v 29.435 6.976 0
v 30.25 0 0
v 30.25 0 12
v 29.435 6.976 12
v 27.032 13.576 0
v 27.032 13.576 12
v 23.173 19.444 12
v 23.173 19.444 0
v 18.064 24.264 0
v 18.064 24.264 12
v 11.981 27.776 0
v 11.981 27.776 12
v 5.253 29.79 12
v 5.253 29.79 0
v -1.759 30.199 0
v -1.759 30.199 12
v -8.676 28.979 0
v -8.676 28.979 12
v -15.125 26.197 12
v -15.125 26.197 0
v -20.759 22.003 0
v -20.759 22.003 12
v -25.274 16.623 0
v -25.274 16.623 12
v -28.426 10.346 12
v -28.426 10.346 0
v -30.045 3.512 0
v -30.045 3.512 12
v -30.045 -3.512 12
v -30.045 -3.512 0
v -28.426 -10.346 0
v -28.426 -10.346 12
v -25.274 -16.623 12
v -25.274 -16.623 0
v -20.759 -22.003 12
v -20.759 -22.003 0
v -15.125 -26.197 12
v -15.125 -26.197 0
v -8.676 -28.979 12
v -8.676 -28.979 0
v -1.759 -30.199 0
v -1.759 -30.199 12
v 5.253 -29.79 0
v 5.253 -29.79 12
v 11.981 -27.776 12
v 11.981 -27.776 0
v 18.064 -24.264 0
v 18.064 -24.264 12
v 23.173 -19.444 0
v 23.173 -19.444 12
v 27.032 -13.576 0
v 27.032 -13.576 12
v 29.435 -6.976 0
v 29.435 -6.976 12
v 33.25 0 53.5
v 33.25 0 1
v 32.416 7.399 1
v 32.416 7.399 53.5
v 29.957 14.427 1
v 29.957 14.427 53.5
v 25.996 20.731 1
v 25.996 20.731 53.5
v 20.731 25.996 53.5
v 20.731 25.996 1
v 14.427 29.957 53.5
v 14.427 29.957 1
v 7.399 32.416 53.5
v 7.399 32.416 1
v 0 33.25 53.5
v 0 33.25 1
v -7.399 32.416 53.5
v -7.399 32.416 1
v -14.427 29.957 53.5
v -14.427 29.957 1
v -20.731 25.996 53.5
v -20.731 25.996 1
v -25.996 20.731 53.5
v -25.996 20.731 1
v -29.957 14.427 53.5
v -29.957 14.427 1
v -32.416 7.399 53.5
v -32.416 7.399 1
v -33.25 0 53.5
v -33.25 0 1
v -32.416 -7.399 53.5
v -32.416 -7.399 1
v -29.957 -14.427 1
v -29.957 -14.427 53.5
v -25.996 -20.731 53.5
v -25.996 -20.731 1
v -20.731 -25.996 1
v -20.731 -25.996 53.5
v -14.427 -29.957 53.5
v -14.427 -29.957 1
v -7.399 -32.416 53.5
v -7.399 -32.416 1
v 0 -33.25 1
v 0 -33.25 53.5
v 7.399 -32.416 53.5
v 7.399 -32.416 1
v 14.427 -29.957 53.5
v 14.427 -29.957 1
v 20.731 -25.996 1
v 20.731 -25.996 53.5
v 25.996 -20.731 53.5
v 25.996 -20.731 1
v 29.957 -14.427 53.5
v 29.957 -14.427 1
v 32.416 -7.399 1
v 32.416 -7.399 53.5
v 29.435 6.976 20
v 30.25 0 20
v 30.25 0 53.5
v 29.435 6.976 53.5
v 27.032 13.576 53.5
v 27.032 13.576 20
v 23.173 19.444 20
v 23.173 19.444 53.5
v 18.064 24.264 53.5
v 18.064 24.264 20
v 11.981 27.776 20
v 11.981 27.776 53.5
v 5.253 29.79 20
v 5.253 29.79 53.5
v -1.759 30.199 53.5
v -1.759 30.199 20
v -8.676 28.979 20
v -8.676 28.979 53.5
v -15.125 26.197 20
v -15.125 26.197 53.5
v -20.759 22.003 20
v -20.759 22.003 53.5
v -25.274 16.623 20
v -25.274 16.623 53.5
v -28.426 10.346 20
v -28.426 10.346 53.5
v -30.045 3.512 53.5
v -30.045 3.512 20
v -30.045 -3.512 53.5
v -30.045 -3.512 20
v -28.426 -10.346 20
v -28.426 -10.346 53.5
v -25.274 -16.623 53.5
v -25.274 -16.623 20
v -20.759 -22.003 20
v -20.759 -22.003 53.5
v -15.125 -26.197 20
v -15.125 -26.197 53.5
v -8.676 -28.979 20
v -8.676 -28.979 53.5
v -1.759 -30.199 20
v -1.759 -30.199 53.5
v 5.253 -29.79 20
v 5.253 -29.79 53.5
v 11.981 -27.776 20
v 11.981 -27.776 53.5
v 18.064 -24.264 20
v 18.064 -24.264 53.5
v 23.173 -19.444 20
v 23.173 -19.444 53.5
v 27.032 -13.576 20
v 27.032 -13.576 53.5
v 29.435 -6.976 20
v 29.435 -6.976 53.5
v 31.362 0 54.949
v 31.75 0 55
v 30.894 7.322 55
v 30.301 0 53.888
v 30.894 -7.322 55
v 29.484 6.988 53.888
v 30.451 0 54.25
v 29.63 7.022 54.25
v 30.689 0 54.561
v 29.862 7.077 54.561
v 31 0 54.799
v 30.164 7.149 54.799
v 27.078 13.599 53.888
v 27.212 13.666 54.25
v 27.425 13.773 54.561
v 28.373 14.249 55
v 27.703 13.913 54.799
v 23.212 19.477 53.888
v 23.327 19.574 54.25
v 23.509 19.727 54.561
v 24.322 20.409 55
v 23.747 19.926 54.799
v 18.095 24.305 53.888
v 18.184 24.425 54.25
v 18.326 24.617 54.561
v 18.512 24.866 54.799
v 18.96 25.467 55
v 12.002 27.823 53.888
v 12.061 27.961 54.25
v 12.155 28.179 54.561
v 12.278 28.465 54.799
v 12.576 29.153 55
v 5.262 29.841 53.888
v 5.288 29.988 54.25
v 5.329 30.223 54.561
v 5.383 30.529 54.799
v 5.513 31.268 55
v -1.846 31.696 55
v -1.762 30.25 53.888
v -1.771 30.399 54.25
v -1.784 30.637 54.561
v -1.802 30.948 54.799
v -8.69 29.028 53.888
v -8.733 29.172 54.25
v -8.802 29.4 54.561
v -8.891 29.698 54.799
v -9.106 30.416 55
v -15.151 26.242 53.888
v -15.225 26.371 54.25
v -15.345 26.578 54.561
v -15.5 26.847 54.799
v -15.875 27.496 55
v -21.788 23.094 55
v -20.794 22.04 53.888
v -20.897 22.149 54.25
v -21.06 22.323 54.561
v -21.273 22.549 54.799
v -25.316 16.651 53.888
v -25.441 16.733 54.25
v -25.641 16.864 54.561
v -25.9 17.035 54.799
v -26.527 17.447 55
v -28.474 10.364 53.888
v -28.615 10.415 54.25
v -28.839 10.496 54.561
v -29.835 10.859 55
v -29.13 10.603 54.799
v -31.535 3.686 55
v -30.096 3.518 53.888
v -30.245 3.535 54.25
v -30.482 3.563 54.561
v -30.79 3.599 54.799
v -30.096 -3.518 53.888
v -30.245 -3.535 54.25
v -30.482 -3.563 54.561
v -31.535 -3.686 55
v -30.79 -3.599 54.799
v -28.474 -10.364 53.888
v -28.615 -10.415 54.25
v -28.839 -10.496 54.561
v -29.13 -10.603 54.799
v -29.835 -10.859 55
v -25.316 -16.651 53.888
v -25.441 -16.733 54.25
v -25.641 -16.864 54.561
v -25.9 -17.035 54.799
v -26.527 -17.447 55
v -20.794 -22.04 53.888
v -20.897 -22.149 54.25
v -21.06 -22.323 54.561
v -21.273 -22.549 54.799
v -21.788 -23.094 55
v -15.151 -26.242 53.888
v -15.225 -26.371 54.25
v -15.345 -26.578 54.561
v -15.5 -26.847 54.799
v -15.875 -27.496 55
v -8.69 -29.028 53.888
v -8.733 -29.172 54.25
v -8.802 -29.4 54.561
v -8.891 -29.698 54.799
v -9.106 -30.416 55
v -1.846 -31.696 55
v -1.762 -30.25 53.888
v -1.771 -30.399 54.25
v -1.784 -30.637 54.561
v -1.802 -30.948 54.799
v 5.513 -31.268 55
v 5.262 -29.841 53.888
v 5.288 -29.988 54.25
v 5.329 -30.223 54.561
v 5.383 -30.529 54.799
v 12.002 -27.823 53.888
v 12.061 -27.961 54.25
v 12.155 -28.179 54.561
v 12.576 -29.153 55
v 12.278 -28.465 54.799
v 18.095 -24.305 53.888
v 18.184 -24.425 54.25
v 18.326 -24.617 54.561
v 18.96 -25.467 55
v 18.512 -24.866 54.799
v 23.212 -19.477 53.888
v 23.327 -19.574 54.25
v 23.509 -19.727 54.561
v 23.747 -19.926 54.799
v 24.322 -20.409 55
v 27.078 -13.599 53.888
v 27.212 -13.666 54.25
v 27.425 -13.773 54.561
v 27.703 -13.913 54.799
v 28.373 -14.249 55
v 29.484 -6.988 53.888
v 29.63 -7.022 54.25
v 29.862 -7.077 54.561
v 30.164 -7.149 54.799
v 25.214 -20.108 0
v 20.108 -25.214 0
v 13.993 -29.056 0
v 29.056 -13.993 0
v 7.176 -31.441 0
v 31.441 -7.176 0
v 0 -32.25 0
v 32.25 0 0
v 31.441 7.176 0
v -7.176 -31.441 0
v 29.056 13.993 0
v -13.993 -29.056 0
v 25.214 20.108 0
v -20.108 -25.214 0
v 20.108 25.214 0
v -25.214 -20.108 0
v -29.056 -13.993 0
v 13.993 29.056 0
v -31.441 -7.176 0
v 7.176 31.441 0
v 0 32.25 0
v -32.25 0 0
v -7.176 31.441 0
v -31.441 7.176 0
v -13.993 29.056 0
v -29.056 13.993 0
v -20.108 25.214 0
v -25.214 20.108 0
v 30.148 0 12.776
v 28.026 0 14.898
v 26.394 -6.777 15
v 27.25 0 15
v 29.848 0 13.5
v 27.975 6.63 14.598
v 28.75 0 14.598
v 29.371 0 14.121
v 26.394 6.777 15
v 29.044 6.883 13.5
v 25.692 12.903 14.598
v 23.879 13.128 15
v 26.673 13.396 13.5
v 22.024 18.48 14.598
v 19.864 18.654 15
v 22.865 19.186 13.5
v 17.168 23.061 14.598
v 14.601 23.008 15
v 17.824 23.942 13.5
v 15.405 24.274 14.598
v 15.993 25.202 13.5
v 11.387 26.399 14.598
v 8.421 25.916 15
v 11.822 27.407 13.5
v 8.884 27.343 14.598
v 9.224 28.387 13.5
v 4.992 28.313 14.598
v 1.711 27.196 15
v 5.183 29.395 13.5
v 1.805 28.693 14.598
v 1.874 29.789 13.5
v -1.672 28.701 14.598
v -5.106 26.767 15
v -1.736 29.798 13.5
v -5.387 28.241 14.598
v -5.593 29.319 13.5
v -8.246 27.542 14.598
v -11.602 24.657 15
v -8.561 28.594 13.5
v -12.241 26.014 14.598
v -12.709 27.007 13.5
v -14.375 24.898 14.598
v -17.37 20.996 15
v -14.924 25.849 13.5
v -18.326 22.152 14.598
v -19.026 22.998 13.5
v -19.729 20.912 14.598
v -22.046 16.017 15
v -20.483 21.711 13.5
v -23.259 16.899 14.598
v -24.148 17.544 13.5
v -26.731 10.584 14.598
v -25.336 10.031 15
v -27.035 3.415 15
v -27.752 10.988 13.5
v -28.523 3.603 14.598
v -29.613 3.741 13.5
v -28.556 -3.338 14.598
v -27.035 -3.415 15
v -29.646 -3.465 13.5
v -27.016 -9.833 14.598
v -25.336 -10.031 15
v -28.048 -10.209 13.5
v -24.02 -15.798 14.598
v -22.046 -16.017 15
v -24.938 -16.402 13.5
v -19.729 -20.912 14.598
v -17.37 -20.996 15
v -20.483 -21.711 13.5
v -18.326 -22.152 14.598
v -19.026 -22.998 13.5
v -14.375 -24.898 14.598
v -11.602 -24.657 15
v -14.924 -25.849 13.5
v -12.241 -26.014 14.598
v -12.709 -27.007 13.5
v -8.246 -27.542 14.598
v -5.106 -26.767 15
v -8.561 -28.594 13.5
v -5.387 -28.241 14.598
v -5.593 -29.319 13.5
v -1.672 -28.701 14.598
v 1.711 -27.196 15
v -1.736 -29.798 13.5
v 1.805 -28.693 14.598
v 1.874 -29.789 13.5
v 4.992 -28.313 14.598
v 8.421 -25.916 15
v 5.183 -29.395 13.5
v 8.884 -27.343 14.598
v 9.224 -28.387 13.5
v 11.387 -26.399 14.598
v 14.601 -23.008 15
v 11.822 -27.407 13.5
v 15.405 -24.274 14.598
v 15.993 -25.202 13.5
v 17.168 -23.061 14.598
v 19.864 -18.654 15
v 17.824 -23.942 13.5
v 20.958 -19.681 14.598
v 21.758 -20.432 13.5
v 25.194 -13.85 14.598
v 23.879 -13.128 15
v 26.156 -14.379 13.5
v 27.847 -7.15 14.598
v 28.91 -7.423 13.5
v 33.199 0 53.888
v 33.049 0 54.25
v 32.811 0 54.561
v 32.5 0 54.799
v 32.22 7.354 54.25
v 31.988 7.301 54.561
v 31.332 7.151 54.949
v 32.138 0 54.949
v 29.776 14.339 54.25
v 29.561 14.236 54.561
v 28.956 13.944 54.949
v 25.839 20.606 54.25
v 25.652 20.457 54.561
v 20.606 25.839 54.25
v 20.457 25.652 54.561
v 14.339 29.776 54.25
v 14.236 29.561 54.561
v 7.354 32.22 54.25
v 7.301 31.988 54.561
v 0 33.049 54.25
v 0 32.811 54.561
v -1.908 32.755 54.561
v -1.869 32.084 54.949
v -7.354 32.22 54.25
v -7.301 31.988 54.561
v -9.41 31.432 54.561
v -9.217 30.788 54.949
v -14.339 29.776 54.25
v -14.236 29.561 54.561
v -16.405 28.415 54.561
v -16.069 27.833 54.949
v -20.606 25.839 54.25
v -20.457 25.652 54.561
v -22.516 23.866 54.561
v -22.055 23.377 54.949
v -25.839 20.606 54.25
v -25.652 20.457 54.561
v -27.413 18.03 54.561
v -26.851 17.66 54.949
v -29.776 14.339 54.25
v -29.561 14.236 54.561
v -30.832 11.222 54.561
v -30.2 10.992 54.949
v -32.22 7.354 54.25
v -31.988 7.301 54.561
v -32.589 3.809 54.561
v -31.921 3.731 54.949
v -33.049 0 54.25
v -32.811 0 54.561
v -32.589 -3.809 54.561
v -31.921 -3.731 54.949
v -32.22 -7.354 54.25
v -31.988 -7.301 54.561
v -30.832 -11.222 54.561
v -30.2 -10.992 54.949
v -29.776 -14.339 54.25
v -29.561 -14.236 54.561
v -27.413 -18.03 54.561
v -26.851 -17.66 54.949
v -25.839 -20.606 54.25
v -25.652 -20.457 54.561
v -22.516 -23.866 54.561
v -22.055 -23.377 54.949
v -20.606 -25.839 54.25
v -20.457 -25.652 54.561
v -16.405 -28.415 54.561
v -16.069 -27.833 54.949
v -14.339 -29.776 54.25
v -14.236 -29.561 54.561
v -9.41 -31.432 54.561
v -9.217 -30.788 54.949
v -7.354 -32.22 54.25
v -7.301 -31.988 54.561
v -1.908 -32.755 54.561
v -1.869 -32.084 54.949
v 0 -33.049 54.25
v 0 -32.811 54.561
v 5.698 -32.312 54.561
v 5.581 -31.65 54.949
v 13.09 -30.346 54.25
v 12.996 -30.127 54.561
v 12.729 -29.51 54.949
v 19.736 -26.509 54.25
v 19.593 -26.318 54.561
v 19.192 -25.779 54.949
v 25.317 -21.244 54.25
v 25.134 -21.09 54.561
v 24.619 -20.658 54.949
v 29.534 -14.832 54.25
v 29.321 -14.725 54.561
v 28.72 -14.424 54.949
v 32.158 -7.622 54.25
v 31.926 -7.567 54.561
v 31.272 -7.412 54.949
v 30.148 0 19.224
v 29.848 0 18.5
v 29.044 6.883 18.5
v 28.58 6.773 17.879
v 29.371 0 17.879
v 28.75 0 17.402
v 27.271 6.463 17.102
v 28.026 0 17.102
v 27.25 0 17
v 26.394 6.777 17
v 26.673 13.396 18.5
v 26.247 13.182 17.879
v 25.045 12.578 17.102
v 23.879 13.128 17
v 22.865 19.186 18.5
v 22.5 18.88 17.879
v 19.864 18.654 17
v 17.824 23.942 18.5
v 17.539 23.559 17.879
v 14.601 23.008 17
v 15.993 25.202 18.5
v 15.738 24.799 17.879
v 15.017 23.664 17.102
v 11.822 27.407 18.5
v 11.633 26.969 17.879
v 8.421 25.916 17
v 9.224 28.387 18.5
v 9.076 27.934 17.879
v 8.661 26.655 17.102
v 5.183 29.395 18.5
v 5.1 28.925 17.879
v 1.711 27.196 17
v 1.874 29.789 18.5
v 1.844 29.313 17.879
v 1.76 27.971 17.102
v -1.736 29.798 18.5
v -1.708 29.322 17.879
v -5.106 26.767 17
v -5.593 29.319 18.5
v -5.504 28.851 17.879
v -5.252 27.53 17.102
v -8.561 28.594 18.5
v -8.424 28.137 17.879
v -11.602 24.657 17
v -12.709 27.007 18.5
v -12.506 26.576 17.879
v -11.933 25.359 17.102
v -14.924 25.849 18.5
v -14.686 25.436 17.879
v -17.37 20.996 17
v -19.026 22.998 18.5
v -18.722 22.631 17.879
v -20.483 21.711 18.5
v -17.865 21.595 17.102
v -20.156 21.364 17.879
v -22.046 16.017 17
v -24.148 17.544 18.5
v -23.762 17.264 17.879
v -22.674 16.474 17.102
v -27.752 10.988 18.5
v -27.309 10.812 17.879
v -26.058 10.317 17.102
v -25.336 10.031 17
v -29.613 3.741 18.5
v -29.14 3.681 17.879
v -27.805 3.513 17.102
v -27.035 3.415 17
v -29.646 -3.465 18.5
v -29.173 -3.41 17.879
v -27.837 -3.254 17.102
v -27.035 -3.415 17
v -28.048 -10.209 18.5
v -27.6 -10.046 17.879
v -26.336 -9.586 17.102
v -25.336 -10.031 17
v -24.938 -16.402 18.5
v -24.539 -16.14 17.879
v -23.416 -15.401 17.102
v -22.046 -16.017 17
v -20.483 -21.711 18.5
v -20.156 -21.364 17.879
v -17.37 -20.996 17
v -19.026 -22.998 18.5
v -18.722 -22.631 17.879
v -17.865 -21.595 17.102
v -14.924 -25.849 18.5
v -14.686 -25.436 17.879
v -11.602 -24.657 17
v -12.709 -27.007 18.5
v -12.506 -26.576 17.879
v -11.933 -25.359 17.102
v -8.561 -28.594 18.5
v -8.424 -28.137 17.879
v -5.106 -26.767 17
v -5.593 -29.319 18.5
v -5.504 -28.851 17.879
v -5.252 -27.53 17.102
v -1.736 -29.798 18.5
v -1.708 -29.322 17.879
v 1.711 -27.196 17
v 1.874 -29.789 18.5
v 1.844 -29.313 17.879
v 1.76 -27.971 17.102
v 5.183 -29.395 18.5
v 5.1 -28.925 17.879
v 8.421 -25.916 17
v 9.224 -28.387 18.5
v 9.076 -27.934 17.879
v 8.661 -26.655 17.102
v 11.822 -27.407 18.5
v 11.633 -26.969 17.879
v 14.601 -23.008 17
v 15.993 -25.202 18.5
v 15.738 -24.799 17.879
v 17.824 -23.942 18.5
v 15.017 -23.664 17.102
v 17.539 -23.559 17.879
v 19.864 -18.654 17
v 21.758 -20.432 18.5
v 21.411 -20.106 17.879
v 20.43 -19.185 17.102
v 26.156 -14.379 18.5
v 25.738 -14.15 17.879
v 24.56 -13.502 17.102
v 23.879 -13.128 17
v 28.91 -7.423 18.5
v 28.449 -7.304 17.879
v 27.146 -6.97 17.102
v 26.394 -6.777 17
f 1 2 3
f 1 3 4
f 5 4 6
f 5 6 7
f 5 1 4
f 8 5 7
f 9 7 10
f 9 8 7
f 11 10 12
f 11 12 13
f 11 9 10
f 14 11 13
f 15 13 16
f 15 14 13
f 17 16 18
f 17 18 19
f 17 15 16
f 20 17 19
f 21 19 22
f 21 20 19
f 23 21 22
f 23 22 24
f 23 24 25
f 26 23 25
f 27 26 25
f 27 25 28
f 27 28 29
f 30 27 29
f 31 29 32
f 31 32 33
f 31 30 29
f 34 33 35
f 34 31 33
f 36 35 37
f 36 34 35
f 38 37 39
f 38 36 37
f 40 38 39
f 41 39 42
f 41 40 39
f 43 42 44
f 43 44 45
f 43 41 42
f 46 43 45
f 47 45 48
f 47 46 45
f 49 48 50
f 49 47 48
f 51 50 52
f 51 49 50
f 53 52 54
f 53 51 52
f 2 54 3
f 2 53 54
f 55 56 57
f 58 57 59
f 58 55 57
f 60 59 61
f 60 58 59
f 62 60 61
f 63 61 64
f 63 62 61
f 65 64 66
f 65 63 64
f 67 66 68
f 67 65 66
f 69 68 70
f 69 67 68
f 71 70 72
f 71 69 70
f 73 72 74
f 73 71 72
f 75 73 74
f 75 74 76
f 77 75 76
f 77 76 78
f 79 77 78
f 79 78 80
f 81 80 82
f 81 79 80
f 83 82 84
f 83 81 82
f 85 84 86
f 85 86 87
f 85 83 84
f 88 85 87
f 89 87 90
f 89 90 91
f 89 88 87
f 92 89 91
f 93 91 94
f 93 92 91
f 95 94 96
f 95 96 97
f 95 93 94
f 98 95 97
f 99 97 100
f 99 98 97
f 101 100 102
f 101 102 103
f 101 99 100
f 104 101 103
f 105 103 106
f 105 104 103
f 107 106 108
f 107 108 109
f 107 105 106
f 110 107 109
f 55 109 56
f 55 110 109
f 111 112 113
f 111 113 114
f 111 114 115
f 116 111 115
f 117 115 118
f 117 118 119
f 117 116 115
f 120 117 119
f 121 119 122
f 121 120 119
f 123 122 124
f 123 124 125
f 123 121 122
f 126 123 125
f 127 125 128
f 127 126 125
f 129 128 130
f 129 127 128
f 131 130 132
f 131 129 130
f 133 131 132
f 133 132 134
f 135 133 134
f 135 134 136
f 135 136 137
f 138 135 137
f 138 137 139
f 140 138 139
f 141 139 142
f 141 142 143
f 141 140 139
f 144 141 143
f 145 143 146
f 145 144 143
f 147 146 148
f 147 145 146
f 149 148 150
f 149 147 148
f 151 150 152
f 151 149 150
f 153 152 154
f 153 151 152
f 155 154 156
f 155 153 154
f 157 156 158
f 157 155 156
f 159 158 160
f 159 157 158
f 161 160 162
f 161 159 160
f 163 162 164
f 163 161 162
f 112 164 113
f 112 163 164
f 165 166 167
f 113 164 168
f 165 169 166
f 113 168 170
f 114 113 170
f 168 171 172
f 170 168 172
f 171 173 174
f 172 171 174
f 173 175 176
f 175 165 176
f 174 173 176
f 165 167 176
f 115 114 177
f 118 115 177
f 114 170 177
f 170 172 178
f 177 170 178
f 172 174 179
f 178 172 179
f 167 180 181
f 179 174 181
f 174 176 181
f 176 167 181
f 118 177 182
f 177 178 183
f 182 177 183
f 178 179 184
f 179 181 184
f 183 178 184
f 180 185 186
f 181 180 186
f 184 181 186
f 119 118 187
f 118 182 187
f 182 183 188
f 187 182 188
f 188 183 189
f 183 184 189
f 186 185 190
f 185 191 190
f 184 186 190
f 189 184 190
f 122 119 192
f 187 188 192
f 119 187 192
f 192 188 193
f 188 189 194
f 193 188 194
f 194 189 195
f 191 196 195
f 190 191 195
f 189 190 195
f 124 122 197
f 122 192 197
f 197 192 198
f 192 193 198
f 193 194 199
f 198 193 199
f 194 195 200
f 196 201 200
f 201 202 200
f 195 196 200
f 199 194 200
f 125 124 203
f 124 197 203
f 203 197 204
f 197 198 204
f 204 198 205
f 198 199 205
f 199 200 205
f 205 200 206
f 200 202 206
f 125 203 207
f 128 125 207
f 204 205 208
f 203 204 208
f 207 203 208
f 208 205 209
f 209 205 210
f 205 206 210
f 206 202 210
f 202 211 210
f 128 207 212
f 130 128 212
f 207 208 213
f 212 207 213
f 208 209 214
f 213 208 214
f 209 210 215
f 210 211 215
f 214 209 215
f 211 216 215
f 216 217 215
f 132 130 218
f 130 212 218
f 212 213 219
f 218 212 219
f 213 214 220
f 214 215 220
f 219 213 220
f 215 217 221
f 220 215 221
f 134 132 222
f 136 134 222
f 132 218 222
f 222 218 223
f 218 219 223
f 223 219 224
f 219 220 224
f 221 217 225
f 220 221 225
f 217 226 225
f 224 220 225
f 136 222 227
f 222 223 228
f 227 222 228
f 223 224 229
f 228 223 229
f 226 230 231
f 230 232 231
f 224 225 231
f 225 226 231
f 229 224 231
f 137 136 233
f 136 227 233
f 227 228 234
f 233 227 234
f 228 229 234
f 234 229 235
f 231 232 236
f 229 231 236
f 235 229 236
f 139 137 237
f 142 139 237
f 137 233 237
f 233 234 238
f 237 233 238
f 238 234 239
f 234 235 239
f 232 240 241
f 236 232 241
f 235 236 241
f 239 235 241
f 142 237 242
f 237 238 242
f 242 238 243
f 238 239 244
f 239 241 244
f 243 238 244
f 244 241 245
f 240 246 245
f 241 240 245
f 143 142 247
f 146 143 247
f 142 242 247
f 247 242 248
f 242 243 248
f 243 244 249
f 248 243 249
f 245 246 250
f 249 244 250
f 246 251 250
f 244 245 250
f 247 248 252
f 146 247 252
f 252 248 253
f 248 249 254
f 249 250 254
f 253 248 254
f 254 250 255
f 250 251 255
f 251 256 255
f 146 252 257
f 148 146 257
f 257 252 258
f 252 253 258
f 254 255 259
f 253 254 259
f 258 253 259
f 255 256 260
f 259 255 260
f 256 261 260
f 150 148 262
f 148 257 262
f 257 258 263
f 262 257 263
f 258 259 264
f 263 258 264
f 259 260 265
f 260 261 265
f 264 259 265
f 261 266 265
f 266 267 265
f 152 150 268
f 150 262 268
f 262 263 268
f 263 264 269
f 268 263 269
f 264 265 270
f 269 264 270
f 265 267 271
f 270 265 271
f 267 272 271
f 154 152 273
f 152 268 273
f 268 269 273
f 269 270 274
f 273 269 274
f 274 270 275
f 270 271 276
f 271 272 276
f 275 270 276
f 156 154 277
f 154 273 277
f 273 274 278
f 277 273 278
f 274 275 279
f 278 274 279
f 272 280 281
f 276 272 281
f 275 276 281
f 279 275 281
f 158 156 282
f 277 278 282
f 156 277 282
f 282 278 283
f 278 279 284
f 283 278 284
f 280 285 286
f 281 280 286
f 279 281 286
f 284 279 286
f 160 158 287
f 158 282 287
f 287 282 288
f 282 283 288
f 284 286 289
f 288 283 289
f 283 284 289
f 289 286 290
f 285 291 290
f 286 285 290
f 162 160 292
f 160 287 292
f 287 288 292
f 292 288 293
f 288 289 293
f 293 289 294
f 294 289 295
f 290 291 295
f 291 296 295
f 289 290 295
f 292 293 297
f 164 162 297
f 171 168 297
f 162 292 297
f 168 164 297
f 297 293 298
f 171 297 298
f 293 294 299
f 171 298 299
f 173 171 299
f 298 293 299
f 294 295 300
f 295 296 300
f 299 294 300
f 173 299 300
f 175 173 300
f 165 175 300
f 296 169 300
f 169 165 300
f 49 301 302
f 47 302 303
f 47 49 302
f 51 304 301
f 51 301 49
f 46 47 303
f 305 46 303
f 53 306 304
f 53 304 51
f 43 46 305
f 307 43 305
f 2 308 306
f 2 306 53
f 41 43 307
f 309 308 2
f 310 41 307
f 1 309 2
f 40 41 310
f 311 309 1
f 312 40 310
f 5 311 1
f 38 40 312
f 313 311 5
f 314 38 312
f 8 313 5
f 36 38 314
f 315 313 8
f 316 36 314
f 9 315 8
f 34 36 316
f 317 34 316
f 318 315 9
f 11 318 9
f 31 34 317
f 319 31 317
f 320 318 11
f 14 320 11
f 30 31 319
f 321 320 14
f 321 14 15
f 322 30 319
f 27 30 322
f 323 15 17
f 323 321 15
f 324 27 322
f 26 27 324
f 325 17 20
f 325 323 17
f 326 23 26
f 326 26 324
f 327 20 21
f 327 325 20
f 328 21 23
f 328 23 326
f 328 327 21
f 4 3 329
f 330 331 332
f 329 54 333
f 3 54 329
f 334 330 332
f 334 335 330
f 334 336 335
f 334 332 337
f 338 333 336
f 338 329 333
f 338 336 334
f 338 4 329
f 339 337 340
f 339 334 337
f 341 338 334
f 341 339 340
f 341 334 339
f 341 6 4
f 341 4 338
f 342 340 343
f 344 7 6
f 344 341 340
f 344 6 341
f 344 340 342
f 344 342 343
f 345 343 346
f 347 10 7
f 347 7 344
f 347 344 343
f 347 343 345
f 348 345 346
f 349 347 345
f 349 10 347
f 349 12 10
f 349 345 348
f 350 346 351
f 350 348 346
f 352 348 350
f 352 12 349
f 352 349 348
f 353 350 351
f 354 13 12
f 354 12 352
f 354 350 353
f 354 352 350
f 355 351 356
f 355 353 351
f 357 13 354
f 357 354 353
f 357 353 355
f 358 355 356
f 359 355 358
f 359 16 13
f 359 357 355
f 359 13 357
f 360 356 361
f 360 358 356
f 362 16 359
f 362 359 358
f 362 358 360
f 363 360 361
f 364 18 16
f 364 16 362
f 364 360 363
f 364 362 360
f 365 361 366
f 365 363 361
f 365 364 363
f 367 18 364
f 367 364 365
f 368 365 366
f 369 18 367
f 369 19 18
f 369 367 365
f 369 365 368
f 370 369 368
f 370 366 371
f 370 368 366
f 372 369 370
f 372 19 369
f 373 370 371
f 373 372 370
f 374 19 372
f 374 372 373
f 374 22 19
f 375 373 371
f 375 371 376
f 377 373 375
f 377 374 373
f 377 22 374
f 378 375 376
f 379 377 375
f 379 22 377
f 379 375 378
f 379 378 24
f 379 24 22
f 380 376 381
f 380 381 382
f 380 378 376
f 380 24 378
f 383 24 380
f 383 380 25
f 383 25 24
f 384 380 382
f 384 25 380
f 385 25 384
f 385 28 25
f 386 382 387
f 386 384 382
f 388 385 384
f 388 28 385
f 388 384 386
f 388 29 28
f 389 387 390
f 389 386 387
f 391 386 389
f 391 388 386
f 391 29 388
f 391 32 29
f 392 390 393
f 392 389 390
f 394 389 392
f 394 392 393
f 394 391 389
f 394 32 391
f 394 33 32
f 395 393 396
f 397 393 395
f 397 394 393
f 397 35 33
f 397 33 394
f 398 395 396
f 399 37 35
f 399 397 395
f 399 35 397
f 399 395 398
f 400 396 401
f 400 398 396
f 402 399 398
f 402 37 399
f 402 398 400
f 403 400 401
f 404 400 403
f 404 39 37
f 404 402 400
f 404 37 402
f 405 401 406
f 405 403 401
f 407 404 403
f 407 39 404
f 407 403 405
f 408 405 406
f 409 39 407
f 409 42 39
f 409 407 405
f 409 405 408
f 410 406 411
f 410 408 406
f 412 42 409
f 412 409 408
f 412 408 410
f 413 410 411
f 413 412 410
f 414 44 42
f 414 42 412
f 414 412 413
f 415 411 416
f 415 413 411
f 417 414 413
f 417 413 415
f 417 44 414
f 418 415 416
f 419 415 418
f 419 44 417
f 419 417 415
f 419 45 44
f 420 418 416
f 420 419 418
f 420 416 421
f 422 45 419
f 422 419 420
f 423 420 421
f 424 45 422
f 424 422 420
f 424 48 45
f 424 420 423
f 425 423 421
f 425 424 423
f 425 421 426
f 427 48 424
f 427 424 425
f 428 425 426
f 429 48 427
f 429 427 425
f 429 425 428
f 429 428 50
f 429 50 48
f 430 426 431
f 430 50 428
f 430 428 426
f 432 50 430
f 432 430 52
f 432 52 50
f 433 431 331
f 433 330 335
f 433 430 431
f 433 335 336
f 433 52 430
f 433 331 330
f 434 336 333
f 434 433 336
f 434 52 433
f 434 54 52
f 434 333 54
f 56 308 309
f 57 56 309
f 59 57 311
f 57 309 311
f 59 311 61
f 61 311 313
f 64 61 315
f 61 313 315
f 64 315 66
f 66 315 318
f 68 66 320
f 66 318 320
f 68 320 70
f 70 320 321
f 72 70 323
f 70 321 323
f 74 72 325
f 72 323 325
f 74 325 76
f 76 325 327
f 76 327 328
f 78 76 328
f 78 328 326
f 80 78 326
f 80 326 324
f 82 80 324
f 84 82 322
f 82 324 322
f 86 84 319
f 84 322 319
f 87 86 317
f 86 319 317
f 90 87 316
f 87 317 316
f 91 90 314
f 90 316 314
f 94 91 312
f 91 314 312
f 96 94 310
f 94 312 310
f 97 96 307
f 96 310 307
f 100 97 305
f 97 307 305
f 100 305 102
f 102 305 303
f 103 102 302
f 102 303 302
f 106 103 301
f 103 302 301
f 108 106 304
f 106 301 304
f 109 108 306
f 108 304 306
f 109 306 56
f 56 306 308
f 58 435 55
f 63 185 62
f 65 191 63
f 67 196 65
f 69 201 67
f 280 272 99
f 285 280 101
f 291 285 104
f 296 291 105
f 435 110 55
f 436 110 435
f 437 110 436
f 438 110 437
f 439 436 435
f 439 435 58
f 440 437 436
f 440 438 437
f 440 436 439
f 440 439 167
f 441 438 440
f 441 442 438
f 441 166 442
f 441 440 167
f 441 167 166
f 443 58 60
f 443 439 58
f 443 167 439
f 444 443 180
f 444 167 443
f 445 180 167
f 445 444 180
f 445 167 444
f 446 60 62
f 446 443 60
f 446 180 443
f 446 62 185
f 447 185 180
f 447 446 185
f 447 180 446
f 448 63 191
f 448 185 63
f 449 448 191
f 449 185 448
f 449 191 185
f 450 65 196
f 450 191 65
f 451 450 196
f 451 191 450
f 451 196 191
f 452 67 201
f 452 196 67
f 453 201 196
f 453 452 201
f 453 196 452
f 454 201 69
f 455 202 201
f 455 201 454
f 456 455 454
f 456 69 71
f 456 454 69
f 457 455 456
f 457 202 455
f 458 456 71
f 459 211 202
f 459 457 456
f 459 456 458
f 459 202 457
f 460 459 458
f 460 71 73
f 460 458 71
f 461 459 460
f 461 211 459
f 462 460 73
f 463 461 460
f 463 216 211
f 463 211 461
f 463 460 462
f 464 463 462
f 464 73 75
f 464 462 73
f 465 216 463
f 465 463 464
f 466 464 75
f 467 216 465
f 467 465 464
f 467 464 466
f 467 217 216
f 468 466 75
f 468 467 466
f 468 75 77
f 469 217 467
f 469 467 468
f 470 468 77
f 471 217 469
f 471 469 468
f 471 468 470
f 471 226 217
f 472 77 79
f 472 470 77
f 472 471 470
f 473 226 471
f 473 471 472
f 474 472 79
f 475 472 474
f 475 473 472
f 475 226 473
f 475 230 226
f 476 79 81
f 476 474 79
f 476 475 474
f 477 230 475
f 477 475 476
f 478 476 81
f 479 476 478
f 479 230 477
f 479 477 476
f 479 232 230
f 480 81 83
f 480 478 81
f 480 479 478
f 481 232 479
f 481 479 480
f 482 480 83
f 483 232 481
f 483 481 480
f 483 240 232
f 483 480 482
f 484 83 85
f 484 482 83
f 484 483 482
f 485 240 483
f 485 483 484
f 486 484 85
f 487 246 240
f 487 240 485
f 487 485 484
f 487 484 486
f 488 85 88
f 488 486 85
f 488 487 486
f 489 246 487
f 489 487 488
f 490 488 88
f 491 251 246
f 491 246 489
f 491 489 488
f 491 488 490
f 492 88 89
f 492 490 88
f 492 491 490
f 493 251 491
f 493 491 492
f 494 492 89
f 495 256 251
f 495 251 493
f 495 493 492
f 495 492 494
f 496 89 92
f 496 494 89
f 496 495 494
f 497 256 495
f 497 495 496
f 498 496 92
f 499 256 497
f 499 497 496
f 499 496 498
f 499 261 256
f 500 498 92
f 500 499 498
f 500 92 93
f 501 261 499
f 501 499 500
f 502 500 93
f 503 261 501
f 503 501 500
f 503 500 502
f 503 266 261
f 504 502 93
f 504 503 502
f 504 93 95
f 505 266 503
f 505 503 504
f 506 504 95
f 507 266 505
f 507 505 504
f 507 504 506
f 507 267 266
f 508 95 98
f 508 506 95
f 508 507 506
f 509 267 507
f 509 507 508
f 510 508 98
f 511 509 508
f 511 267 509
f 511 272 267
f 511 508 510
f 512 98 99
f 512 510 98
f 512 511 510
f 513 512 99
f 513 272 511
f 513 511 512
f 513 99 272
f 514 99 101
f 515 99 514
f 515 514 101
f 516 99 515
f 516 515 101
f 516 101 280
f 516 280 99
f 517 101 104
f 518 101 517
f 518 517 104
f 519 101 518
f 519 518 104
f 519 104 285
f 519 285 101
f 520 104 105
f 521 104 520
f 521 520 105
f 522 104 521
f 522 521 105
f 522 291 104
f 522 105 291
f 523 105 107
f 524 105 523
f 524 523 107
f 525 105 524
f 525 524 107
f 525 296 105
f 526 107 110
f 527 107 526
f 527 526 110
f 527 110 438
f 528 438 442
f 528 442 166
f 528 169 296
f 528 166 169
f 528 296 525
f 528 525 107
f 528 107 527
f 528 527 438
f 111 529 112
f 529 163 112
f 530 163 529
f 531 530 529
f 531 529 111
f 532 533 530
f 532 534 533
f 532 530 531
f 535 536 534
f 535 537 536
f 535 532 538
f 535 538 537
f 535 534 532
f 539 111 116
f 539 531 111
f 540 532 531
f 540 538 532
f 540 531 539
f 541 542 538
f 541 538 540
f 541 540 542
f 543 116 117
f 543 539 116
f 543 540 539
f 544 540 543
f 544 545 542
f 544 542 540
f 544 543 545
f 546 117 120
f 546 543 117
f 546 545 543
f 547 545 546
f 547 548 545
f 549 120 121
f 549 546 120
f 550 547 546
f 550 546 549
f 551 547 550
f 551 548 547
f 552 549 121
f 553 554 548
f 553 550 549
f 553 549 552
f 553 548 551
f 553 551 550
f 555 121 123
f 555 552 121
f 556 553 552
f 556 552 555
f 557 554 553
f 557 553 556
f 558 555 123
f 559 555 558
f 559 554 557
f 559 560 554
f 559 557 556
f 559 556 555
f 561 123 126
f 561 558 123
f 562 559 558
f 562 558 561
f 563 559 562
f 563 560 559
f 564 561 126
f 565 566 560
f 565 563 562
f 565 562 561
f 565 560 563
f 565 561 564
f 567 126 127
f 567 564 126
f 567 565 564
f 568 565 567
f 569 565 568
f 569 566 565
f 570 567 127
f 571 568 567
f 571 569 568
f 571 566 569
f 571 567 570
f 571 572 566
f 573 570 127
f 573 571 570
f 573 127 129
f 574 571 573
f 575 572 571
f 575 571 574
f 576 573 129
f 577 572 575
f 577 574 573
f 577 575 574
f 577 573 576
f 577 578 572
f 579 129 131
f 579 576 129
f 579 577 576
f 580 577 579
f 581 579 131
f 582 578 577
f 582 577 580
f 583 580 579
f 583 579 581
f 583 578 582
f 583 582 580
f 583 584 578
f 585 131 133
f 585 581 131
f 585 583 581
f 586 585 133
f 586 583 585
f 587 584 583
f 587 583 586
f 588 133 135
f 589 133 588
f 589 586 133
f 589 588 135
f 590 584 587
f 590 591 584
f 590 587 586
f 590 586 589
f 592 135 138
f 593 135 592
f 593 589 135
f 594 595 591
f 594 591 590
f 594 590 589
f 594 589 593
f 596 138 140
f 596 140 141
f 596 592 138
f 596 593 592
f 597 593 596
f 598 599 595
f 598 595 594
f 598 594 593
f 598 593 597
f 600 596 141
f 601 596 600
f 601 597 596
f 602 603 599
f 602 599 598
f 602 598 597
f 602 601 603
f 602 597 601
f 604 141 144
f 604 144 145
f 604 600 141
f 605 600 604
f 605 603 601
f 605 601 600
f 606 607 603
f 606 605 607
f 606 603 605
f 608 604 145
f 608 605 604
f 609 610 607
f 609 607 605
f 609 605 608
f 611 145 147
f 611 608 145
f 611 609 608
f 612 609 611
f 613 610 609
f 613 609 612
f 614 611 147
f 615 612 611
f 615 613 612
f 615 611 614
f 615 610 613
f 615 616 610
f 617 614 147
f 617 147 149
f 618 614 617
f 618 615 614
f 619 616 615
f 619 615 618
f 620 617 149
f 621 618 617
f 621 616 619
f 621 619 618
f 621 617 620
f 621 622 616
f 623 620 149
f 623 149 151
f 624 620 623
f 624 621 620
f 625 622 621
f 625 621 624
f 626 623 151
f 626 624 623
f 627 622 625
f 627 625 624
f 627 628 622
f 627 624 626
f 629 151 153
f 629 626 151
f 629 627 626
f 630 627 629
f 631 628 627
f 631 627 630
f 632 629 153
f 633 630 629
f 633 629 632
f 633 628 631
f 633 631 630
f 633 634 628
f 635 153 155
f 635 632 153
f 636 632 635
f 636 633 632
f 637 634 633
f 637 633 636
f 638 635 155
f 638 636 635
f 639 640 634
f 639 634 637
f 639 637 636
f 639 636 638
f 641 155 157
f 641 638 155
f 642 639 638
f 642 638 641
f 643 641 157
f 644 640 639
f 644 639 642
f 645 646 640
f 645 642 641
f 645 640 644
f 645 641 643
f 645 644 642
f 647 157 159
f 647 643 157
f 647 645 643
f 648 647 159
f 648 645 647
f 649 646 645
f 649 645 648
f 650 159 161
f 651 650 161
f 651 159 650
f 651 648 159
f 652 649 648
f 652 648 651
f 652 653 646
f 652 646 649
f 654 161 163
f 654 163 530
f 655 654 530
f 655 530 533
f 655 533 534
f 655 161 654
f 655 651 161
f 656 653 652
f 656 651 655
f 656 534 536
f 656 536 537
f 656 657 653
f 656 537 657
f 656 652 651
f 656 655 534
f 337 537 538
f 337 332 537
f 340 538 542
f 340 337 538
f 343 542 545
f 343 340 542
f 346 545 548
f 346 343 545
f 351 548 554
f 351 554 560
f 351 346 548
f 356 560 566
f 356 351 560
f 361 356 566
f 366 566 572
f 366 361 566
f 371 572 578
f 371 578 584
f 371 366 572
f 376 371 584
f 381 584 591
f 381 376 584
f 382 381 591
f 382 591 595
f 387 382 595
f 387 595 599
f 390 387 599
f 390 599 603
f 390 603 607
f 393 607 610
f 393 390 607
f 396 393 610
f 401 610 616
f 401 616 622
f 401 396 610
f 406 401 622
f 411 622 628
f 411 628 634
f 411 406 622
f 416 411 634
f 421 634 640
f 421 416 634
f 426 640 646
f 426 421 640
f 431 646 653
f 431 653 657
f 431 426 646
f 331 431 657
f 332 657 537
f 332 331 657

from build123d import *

# Parameters (mm, degrees)
F2_R    = 2.99999
F3_R    = 2.99999
F4_R    = 1.49999
F5_SIZE = 1


# Not quite as in the source:
# - a fillet or chamfer is up to 0.001 mm smaller than in the source, because OpenCascade refuses the exact size


with BuildPart() as f1:
    # F0 (on Front) → F1 (revolve)
    with BuildSketch(Plane.XZ):
        Polygon((30.25, 0), (33.25, 0), (33.25, 55), (30.25, 55), (30.25, 17), (27.25, 17), (27.25, 15), (30.25, 15), align=None)
    revolve(axis=Axis((0, 0, 28.8916025311), (0, 0, 1)))

    # F2 (radius 3 in the source; OpenCascade refuses exactly that, so slightly less here)
    f2_edges = [f1.edges().sort_by_distance(p)[0] for p in [
        (-30.25, 0, 17),
    ]]
    fillet(f2_edges, radius=F2_R)

    # F3 (radius 3 in the source; OpenCascade refuses exactly that, so slightly less here)
    f3_edges = [f1.edges().sort_by_distance(p)[0] for p in [
        (-30.25, 0, 15),
    ]]
    fillet(f3_edges, radius=F3_R)

    # F4 (radius 1.5 in the source; OpenCascade refuses exactly that, so slightly less here)
    f4_edges = [f1.edges().sort_by_distance(p)[0] for p in [
        (-30.25, 0, 55),
        (-33.25, 0, 55),
    ]]
    fillet(f4_edges, radius=F4_R)

    # F5
    f5_edges = [f1.edges().sort_by_distance(p)[0] for p in [
        (-33.25, 0, 0),
    ]]
    chamfer(f5_edges, length=F5_SIZE)


solid = f1.part
